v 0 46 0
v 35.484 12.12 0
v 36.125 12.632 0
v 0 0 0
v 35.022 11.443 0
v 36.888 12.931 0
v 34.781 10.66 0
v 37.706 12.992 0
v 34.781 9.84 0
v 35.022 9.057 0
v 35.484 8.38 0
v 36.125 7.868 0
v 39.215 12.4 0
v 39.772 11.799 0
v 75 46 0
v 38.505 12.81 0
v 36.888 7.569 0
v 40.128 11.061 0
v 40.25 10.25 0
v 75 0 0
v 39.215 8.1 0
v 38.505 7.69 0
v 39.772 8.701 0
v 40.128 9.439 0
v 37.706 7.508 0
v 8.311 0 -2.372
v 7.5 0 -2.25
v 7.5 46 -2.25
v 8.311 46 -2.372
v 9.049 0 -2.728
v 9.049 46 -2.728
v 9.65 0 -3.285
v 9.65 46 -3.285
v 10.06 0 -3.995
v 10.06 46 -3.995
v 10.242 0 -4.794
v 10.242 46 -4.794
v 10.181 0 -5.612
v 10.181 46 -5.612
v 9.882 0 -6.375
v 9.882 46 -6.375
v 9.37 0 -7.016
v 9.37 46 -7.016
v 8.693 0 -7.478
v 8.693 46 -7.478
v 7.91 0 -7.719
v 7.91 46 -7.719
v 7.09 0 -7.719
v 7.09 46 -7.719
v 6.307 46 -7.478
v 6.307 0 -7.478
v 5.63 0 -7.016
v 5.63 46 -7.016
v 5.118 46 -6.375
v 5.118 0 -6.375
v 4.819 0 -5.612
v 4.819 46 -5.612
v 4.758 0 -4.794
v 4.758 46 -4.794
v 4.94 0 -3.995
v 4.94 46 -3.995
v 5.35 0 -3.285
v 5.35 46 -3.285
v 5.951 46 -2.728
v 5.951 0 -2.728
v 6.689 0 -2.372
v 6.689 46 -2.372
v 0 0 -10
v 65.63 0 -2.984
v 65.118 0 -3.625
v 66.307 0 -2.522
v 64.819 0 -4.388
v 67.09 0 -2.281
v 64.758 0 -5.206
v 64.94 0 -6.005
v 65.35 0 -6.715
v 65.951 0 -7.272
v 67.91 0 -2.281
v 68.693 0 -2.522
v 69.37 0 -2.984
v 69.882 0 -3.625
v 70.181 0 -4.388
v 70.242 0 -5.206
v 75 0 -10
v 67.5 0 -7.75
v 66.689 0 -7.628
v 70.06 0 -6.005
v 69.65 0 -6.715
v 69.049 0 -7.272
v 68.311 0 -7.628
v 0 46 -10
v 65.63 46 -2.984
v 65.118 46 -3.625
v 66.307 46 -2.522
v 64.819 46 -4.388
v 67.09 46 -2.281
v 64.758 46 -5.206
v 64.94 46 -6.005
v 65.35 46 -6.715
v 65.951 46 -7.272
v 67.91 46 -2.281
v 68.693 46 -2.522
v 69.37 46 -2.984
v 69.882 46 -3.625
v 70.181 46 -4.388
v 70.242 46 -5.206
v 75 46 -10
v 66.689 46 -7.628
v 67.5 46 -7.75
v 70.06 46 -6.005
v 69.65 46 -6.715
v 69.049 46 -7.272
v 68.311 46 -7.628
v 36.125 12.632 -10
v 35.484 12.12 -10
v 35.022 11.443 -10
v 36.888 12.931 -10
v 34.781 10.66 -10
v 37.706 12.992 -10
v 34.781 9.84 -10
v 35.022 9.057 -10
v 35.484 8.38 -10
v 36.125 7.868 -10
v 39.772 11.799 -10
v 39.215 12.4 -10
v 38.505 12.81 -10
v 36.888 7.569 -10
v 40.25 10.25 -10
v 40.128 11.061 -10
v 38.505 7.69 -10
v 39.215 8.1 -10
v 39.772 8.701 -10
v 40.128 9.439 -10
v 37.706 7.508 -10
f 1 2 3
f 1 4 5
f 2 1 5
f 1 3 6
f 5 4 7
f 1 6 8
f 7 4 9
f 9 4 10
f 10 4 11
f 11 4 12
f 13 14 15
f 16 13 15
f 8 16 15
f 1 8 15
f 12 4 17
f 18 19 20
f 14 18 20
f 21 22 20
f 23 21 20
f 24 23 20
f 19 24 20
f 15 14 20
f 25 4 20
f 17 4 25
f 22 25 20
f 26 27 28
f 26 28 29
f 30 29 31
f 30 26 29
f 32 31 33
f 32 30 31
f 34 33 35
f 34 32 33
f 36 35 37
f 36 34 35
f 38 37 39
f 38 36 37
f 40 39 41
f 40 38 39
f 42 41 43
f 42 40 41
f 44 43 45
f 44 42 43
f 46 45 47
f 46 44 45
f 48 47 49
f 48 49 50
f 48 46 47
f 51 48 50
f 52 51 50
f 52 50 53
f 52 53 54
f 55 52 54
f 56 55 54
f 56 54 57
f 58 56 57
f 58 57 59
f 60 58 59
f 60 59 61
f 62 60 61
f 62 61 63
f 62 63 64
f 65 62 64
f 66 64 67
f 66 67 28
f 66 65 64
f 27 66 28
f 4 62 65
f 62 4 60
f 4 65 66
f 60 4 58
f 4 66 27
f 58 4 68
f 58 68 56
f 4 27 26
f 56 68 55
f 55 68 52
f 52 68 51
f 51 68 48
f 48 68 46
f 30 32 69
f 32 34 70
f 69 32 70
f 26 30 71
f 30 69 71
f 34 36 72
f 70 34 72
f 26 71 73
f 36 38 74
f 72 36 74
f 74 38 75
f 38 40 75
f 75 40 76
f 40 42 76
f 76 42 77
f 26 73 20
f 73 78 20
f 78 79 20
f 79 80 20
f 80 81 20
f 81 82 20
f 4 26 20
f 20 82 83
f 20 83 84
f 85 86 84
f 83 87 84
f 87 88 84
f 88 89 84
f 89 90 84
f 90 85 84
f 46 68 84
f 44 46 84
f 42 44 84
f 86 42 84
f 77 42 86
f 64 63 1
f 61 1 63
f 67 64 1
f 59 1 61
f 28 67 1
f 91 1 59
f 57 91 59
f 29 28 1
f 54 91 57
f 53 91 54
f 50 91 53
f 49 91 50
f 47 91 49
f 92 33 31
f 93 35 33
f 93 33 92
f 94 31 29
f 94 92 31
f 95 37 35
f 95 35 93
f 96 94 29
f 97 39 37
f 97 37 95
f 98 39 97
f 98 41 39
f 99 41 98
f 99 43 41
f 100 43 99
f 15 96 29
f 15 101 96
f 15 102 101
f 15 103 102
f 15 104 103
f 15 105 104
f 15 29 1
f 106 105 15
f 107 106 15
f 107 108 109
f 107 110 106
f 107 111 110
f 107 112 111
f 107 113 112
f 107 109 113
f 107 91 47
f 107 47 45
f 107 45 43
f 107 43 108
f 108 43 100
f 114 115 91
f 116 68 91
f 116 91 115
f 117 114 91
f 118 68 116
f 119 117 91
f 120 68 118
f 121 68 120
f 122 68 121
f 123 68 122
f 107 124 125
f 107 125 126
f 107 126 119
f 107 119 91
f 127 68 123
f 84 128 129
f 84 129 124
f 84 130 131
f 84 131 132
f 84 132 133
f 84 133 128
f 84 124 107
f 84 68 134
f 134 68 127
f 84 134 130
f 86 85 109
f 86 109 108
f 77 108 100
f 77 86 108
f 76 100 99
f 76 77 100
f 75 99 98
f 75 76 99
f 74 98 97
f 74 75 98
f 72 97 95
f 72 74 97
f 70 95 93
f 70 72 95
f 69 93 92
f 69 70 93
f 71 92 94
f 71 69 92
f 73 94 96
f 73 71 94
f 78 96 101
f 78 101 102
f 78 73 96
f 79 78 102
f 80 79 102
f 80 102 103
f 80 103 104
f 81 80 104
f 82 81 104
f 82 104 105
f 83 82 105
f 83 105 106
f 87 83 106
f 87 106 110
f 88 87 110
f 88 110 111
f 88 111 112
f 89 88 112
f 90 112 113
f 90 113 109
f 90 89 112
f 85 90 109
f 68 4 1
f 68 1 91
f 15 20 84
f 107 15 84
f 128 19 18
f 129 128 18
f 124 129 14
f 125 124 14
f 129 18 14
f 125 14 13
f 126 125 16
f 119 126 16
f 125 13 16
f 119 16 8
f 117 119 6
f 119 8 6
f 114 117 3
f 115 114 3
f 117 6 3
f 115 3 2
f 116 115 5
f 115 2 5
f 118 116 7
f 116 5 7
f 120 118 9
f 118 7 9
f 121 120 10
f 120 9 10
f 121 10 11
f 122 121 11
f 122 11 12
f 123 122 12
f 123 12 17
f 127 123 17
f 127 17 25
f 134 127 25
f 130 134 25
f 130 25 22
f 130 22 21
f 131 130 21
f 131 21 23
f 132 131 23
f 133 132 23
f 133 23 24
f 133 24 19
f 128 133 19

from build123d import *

# Parameters (mm, degrees)
SKETCH1_W           = 75
SKETCH1_H           = 10
SKETCH1_R           = 2.75
BOSS_EXTRUDE1_DEPTH = 46
SKETCH3_R           = 2.75
CUT_EXTRUDE1_DEPTH  = 45


with BuildPart() as part:
    # Sketch1 → Boss-Extrude1 (new body)
    with BuildSketch(Plane(origin=(0, 0, 0), x_dir=(1, 0, 0), z_dir=(0, 1, 0))):
        with Locations((37.5, 5)):
            Rectangle(SKETCH1_W, SKETCH1_H)
        with Locations(Location((7.5, 5, 0), (0, 0, 270))):
            Circle(SKETCH1_R, mode=Mode.SUBTRACT)
        with Locations(Location((67.5, 5, 0), (0, 0, 90))):
            Circle(SKETCH1_R, mode=Mode.SUBTRACT)
    extrude(amount=BOSS_EXTRUDE1_DEPTH)

    # Sketch3 → Cut-Extrude1 (cut)
    with BuildSketch(Plane.XY):
        with Locations((37.5, 10.25)):
            Circle(SKETCH3_R)
    extrude(amount=-CUT_EXTRUDE1_DEPTH, mode=Mode.SUBTRACT)


solid = part.part
